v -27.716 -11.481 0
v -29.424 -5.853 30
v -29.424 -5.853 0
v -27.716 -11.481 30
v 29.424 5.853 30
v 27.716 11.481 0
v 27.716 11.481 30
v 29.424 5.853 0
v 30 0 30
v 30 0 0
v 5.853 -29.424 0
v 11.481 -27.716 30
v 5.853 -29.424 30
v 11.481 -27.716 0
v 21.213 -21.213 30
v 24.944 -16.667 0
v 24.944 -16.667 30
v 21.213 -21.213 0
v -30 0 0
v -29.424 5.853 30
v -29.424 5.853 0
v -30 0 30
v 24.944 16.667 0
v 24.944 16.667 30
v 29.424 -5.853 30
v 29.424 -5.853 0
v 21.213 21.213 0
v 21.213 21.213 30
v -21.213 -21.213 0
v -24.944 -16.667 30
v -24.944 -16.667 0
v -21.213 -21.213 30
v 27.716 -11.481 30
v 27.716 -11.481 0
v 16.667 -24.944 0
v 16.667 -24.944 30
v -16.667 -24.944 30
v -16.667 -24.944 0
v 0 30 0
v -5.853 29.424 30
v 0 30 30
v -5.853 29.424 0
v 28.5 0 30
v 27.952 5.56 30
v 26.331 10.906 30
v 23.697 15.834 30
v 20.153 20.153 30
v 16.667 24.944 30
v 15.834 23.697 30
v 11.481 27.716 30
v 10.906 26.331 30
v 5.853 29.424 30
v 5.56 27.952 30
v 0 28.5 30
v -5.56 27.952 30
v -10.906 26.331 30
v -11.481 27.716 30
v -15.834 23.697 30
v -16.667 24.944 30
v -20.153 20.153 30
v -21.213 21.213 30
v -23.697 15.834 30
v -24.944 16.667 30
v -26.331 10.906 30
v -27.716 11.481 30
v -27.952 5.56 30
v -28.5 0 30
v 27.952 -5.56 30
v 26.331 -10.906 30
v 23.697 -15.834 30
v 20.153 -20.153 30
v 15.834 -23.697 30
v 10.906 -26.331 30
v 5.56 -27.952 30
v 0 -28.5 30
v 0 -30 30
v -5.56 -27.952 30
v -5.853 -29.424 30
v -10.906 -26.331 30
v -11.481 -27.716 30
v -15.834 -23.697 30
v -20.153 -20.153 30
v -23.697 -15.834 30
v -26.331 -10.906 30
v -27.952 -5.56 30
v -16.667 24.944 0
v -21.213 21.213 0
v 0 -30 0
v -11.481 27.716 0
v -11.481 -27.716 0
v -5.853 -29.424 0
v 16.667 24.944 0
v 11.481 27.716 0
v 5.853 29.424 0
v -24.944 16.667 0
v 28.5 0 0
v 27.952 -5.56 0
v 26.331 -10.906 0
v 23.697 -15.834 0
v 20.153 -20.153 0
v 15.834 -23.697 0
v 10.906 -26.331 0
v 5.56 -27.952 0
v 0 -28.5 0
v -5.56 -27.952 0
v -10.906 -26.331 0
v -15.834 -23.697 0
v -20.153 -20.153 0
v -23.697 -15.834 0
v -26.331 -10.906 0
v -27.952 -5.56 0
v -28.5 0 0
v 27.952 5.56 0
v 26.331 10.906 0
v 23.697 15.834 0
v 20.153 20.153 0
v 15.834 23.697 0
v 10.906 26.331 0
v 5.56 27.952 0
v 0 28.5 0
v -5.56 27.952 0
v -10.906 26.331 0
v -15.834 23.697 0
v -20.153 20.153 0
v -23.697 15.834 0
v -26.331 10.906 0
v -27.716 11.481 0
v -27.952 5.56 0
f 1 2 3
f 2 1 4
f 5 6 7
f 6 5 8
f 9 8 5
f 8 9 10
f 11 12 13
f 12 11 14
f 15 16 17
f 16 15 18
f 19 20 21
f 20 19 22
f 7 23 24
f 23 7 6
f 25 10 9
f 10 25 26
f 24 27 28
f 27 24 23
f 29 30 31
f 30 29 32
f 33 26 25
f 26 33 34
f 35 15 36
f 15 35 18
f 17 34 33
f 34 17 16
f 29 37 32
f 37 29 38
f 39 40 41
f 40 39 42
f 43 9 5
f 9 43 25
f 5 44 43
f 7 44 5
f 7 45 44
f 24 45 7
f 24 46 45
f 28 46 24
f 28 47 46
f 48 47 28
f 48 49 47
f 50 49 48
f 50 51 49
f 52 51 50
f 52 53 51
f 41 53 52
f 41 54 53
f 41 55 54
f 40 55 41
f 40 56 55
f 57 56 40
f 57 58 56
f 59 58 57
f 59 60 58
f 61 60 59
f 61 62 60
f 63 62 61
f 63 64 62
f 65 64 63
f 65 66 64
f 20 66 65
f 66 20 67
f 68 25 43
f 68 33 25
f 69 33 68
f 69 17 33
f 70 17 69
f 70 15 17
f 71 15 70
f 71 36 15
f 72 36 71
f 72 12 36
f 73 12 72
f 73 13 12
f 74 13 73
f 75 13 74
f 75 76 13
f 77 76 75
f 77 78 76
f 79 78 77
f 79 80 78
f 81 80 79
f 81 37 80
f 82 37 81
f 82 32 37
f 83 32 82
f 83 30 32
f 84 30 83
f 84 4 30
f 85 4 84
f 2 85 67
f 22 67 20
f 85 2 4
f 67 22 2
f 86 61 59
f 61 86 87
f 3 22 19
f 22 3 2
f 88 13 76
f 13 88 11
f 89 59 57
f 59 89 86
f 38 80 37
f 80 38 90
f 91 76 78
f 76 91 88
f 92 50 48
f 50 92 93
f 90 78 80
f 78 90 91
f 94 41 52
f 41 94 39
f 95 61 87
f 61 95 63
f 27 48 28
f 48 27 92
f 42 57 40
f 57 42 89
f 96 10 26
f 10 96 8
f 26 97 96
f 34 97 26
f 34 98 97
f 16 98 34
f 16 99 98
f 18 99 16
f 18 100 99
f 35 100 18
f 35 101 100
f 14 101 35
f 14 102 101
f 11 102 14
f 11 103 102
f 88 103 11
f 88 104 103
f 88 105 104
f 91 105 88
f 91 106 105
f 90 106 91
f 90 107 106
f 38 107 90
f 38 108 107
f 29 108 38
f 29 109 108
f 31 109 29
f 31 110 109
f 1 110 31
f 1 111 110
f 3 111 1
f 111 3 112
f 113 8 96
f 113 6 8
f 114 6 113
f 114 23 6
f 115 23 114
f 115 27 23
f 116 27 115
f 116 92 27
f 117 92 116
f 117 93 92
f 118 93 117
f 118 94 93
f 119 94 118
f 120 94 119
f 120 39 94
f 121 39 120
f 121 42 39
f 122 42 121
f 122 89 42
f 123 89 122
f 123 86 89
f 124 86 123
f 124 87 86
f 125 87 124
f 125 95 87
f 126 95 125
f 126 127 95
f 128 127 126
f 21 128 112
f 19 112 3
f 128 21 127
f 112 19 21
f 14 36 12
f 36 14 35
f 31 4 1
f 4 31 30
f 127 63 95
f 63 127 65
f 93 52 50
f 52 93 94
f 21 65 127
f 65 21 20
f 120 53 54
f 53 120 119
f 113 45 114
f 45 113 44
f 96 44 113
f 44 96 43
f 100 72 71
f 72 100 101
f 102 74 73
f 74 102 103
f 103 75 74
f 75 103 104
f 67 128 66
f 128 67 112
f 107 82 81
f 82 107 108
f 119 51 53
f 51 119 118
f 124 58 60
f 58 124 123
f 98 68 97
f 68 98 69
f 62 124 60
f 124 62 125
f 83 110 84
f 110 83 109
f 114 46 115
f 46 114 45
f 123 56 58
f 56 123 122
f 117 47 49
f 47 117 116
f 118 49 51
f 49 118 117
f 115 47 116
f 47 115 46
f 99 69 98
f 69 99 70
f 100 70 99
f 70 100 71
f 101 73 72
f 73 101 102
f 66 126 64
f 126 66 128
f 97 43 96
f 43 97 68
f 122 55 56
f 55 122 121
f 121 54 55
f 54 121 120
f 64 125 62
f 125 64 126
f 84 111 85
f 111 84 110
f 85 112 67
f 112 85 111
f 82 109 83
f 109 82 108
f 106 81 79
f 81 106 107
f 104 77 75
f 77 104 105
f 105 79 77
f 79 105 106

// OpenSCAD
$fn = 32;

// ----------------------------------------------------------------------
// Thin tube: 1.5 mm wall
// ----------------------------------------------------------------------

// --- parameters (mm) ---
tube_od = 60;             // outer diameter
tube_h = 30;              // height, Z
wall = 1.5;               // wall thickness
fit_tol = 0.1;            // tolerance for press fits, mm
free_tol = 0.5;           // tolerance for clearance fits, mm

difference() {
  cylinder(h = tube_h, d = tube_od);
  translate([0, 0, -1]) cylinder(h = tube_h + 2, d = tube_od - 2 * wall);
}
